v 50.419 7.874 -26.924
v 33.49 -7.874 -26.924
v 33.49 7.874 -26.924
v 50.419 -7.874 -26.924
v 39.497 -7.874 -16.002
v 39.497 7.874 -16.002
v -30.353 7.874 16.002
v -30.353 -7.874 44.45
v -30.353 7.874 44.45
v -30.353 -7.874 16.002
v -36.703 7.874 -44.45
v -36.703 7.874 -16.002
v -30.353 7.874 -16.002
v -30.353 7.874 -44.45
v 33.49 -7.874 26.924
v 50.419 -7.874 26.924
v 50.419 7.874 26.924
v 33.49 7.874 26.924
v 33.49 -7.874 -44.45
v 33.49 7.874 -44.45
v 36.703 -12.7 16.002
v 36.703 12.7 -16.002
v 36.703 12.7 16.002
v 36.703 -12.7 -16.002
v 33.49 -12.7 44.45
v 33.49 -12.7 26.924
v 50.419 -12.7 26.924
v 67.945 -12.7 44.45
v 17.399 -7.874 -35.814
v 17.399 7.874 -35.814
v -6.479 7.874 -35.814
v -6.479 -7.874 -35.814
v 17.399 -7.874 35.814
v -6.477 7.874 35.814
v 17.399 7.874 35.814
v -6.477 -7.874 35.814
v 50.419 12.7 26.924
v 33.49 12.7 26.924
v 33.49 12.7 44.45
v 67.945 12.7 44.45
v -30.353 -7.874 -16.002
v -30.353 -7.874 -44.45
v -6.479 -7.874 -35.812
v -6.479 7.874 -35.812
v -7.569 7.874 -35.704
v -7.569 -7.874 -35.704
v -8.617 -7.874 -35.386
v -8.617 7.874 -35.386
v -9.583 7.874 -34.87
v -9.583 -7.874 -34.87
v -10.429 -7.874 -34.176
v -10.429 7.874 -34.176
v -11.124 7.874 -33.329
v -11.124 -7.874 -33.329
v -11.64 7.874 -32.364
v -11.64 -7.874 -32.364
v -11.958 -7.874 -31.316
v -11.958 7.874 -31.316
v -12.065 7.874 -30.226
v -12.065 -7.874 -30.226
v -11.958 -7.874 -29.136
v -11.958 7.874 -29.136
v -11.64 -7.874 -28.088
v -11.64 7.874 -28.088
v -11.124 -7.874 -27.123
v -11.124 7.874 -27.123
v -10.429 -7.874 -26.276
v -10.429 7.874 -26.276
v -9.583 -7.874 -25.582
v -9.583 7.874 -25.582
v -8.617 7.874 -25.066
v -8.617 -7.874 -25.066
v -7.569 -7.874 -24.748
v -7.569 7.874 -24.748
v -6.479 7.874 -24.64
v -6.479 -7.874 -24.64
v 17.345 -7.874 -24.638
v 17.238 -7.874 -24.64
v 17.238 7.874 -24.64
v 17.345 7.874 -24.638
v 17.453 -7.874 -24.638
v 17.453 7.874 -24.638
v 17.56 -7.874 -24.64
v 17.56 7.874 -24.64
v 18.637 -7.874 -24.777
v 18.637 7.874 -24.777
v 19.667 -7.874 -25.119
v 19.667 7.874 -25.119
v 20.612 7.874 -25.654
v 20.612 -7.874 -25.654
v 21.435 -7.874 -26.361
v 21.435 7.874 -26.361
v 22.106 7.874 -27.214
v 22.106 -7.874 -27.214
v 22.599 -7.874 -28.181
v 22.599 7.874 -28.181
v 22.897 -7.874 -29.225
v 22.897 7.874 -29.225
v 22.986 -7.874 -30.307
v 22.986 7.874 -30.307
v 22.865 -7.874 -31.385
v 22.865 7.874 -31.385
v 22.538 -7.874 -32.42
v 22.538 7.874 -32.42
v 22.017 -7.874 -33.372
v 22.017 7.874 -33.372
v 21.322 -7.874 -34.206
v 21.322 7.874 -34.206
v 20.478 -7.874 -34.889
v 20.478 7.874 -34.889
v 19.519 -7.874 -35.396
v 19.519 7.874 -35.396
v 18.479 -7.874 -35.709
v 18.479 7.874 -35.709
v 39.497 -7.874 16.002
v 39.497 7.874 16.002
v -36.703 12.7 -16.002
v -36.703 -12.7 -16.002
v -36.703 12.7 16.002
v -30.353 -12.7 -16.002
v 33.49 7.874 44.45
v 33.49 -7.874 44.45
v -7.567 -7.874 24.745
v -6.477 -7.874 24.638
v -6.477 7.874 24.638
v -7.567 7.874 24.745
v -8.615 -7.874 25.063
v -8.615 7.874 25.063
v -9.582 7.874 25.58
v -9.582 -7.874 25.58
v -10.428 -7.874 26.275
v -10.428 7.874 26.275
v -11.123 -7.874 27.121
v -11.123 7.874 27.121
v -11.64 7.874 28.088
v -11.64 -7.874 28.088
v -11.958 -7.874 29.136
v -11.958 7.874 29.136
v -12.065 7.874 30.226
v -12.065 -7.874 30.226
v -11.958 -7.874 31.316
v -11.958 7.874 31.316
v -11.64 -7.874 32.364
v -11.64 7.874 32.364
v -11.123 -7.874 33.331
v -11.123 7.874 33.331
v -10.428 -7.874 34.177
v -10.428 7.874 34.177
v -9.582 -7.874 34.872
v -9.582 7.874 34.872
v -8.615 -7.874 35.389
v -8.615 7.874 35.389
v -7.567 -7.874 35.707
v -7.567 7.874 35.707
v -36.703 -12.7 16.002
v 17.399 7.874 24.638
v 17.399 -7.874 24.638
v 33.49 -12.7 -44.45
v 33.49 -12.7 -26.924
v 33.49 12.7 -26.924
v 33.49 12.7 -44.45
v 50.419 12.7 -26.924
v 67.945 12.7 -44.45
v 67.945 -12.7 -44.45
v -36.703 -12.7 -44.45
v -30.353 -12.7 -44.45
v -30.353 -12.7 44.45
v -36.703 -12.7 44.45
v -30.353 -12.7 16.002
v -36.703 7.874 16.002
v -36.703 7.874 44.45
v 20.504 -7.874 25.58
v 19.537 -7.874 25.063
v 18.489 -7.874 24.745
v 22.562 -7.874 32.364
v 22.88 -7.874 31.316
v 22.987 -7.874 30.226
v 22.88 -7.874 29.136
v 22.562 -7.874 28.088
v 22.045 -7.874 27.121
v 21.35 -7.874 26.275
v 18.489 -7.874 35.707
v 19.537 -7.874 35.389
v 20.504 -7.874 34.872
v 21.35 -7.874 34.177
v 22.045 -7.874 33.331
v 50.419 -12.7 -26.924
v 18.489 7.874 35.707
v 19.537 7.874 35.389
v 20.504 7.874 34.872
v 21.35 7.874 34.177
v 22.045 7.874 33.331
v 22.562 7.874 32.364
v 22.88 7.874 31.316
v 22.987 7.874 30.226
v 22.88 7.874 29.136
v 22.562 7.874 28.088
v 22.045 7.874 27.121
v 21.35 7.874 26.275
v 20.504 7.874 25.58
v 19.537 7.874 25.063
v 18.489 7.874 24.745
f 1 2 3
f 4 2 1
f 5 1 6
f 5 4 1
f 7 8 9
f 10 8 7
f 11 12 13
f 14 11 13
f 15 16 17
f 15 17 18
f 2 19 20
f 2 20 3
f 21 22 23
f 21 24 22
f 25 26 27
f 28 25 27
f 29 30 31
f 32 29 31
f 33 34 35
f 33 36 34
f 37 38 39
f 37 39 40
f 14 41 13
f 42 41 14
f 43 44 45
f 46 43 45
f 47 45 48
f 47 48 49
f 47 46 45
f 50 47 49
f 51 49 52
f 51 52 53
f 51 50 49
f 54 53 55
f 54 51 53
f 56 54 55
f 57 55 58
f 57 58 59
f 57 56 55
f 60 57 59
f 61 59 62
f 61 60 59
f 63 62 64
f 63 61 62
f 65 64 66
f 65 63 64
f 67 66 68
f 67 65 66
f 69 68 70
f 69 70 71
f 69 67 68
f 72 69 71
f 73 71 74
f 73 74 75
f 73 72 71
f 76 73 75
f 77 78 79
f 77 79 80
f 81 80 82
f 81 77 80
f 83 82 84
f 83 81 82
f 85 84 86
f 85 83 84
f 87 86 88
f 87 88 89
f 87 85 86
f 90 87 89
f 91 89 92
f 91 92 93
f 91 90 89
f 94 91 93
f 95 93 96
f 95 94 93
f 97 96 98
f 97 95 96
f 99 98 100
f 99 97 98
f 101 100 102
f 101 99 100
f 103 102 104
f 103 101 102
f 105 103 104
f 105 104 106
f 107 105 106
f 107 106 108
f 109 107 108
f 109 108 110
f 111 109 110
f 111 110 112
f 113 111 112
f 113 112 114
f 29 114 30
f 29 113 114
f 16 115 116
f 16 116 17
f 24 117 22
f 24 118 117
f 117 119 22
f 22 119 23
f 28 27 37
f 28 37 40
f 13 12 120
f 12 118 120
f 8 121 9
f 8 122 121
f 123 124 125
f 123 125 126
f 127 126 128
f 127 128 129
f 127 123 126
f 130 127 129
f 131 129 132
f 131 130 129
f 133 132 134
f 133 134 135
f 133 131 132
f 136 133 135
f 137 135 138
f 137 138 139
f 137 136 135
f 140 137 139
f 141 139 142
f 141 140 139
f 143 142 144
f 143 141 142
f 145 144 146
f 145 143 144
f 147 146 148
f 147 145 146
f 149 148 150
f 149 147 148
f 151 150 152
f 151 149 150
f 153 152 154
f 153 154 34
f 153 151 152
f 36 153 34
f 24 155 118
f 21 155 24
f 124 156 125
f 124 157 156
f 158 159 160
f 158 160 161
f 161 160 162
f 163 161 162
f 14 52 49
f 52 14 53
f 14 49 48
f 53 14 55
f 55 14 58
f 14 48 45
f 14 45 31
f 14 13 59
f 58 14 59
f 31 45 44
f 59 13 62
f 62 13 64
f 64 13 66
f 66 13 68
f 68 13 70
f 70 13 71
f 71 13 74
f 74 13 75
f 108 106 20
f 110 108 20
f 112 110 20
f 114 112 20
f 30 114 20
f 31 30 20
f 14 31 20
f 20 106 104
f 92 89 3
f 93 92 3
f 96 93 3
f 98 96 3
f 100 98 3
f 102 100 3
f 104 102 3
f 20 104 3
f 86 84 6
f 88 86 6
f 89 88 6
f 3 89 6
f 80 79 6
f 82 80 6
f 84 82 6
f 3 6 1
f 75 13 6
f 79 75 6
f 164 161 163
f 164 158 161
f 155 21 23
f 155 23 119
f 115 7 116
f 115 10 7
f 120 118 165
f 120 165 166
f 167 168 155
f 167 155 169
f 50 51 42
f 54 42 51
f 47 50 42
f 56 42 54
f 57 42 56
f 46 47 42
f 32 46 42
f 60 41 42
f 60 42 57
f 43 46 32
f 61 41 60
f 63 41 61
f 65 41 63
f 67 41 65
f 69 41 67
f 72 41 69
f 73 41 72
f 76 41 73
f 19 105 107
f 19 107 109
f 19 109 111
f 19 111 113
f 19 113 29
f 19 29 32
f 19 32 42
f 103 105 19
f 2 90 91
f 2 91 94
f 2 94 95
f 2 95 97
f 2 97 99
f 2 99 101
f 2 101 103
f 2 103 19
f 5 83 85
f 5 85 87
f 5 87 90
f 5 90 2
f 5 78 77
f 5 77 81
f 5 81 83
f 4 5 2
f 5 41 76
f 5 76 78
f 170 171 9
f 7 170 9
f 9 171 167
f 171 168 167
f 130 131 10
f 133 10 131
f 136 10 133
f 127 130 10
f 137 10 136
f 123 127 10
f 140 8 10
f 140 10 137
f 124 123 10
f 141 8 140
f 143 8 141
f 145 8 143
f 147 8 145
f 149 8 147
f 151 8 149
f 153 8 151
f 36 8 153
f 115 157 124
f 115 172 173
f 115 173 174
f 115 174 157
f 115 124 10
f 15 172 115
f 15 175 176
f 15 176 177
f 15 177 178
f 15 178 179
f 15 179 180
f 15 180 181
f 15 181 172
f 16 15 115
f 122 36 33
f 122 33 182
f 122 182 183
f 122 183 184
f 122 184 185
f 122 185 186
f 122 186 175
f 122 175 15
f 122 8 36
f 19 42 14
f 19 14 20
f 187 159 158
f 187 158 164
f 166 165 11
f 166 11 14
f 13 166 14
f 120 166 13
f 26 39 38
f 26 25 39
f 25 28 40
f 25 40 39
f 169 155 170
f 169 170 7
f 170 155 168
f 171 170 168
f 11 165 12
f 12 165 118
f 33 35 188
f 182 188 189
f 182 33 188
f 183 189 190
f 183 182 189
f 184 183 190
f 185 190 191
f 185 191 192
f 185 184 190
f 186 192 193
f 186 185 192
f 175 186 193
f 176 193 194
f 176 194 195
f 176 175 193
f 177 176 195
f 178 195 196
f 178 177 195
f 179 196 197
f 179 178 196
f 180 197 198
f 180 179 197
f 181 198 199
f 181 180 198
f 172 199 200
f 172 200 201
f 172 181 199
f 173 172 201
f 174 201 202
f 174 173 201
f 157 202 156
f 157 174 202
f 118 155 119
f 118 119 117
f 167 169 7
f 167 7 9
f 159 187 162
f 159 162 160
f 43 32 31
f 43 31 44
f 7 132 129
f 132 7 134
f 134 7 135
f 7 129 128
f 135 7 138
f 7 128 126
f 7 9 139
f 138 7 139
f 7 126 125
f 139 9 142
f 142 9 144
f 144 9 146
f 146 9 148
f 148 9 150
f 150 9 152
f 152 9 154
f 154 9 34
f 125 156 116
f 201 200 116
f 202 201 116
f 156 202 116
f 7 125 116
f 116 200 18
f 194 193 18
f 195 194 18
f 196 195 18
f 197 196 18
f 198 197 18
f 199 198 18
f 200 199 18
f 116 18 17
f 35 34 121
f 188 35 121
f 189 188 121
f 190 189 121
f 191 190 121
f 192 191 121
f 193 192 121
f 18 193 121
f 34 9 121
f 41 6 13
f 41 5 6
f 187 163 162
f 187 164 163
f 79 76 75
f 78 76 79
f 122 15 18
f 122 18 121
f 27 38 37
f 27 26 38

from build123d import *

# Parameters (mm, degrees)
F1_DEPTH      = 12.7
F2_DEPTH      = 7.874
F0_W          = 6.35
F0_H          = 28.448
F3_DEPTH      = 12.7
F3_DEPTH_BACK = 7.874
F4_DEPTH      = 12.7
F4_DEPTH_BACK = 7.874


with BuildPart() as f1:
    # F0 (on Front) → F1 (new body, symmetric)
    with BuildSketch(Plane.XZ):
        Polygon((33.490138276, 26.924), (50.419, 26.924), (67.945, 44.45), (33.490138276, 44.45), align=None)
    extrude(amount=F1_DEPTH, both=True)


with BuildPart() as f1b:
    # F0 (on Front) → F1, piece 2 (new body, symmetric)
    with BuildSketch(Plane.XZ):
        Polygon((36.703, -16.002), (36.703, 16.002), (-30.353, 16.002), (-36.703, 16.002), (-36.703, -16.002), (-30.353, -16.002), align=None)
    extrude(amount=F1_DEPTH, both=True)


with BuildPart() as f1c:
    # F0 (on Front) → F1, piece 3 (new body, symmetric)
    with BuildSketch(Plane.XZ):
        Polygon((67.945, -44.45), (50.419, -26.924), (33.490138276, -26.924), (33.490138276, -44.45), align=None)
    extrude(amount=F1_DEPTH, both=True)


with BuildPart() as f2:
    # F0 (on Front) → F2 (new body, symmetric)
    with BuildSketch(Plane.XZ):
        Polygon((-30.353, 16.002), (36.703, 16.002), (39.497, 16.002), (50.419, 26.924), (33.490138276, 26.924), (33.490138276, 44.45), (-30.353, 44.45), align=None)
        with BuildLine():
            ThreePointArc((-6.477, 24.638), (-12.065, 30.226), (-6.477, 35.814))
            Line((-6.477, 35.814), (17.399, 35.814))
            ThreePointArc((17.399, 35.814), (22.987, 30.226), (17.399, 24.638))
            Line((17.399, 24.638), (-6.477, 24.638))
        make_face(mode=Mode.SUBTRACT)
    extrude(amount=F2_DEPTH, both=True)


with BuildPart() as f2b:
    # F0 (on Front) → F2, piece 2 (new body, symmetric)
    with BuildSketch(Plane.XZ):
        Polygon((39.497, -16.002), (36.703, -16.002), (-30.353, -16.002), (-30.353, -44.45), (33.490138276, -44.45), (33.490138276, -26.924), (50.419, -26.924), align=None)
        with BuildLine():
            Line((17.399, -35.814), (-6.4793322235, -35.814))
            Line((-6.4793322235, -35.814), (-6.4793322235, -35.8116677765))
            ThreePointArc((-6.4793322235, -35.8116677765), (-12.065, -30.226), (-6.4793322235, -24.6403322235))
            Line((-6.4793322235, -24.6403322235), (17.2375704768, -24.6403322235))
            ThreePointArc((17.2375704768, -24.6403322235), (17.399, -24.638), (17.5604295232, -24.6403322235))
            ThreePointArc((17.5604295232, -24.6403322235), (22.9864169137, -30.3067231847), (17.399, -35.814))
        make_face(mode=Mode.SUBTRACT)
    extrude(amount=F2_DEPTH, both=True)


with BuildPart() as f3:
    # F0 (on Front) → F3 (new body, two sides)
    with BuildSketch(Plane.XZ) as f3_sk:
        with Locations((-33.528, 30.226)):
            Rectangle(F0_W, F0_H)
    extrude(amount=F3_DEPTH)
    extrude(f3_sk.sketch, amount=-F3_DEPTH_BACK)


with BuildPart() as f4:
    # F0 (on Front) → F4 (new body, two sides)
    with BuildSketch(Plane.XZ) as f4_sk:
        with Locations((-33.528, -30.226)):
            Rectangle(F0_W, F0_H)
    extrude(amount=F4_DEPTH)
    extrude(f4_sk.sketch, amount=-F4_DEPTH_BACK)


solid = Compound([f1.part, f1b.part, f1c.part, f2.part, f2b.part, f3.part, f4.part])
